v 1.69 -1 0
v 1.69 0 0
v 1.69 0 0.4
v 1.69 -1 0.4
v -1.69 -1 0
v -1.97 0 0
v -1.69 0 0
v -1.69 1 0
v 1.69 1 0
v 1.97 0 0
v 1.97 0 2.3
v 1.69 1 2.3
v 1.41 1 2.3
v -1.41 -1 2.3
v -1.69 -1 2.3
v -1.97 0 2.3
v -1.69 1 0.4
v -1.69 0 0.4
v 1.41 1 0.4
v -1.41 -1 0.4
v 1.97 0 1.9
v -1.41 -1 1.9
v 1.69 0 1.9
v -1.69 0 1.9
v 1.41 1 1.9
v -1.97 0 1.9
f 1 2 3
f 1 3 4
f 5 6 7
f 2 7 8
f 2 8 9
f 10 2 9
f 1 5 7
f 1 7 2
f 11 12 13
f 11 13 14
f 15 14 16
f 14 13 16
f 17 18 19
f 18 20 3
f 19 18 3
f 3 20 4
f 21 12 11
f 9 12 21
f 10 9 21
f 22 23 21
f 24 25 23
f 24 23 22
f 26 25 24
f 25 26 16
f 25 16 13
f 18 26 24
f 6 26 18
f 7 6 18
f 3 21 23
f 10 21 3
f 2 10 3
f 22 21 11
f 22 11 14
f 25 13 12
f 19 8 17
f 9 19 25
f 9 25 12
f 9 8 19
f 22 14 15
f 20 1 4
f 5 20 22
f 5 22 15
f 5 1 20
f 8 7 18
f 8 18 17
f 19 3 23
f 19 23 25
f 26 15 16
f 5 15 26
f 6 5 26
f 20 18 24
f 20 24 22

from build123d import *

# Parameters (mm, degrees)
PAD_DEPTH             = 0.4
POLARPATTERN_COUNT    = 2
PAD001_DEPTH          = 1.5
POLARPATTERN001_COUNT = 2
PAD002_DEPTH          = 0.4


with BuildPart() as part:
    # Sketch → Pad (new body)
    with BuildSketch(Plane.XY):
        Polygon((-1.69, 1), (1.69, 1), (1.97, 0), (-1.69, 0), align=None)
    pad = extrude(amount=PAD_DEPTH)

    # PolarPattern: Pad ×2 about axis
    polarpattern_axis = Axis((0, 0, 0), (0, 0, 1))
    for i in range(1, POLARPATTERN_COUNT):
        add(pad.rotate(polarpattern_axis, i * 360 / POLARPATTERN_COUNT))

    # Sketch001 (on Face5 of PolarPattern) → Pad001 (join)
    with BuildSketch(Plane.XY.offset(0.4)):
        Polygon((1.41, 1), (1.69, 1), (1.97, 0), (1.69, 0), align=None)
    pad001 = extrude(amount=PAD001_DEPTH)

    # PolarPattern001: Pad001 ×2 about axis
    polarpattern001_axis = Axis((0, 0, 0.4), (0, 0, 1))
    for i in range(1, POLARPATTERN001_COUNT):
        add(pad001.rotate(polarpattern001_axis, i * 360 / POLARPATTERN001_COUNT))

    # Sketch002 (on Face13 of PolarPattern001) → Pad002 (join)
    with BuildSketch(Plane.XY.offset(1.9)):
        Polygon((1.41, 1), (1.69, 1), (1.97, 0), (-1.41, -1), (-1.69, -1), (-1.97, 0), align=None)
    extrude(amount=PAD002_DEPTH)


solid = part.part
